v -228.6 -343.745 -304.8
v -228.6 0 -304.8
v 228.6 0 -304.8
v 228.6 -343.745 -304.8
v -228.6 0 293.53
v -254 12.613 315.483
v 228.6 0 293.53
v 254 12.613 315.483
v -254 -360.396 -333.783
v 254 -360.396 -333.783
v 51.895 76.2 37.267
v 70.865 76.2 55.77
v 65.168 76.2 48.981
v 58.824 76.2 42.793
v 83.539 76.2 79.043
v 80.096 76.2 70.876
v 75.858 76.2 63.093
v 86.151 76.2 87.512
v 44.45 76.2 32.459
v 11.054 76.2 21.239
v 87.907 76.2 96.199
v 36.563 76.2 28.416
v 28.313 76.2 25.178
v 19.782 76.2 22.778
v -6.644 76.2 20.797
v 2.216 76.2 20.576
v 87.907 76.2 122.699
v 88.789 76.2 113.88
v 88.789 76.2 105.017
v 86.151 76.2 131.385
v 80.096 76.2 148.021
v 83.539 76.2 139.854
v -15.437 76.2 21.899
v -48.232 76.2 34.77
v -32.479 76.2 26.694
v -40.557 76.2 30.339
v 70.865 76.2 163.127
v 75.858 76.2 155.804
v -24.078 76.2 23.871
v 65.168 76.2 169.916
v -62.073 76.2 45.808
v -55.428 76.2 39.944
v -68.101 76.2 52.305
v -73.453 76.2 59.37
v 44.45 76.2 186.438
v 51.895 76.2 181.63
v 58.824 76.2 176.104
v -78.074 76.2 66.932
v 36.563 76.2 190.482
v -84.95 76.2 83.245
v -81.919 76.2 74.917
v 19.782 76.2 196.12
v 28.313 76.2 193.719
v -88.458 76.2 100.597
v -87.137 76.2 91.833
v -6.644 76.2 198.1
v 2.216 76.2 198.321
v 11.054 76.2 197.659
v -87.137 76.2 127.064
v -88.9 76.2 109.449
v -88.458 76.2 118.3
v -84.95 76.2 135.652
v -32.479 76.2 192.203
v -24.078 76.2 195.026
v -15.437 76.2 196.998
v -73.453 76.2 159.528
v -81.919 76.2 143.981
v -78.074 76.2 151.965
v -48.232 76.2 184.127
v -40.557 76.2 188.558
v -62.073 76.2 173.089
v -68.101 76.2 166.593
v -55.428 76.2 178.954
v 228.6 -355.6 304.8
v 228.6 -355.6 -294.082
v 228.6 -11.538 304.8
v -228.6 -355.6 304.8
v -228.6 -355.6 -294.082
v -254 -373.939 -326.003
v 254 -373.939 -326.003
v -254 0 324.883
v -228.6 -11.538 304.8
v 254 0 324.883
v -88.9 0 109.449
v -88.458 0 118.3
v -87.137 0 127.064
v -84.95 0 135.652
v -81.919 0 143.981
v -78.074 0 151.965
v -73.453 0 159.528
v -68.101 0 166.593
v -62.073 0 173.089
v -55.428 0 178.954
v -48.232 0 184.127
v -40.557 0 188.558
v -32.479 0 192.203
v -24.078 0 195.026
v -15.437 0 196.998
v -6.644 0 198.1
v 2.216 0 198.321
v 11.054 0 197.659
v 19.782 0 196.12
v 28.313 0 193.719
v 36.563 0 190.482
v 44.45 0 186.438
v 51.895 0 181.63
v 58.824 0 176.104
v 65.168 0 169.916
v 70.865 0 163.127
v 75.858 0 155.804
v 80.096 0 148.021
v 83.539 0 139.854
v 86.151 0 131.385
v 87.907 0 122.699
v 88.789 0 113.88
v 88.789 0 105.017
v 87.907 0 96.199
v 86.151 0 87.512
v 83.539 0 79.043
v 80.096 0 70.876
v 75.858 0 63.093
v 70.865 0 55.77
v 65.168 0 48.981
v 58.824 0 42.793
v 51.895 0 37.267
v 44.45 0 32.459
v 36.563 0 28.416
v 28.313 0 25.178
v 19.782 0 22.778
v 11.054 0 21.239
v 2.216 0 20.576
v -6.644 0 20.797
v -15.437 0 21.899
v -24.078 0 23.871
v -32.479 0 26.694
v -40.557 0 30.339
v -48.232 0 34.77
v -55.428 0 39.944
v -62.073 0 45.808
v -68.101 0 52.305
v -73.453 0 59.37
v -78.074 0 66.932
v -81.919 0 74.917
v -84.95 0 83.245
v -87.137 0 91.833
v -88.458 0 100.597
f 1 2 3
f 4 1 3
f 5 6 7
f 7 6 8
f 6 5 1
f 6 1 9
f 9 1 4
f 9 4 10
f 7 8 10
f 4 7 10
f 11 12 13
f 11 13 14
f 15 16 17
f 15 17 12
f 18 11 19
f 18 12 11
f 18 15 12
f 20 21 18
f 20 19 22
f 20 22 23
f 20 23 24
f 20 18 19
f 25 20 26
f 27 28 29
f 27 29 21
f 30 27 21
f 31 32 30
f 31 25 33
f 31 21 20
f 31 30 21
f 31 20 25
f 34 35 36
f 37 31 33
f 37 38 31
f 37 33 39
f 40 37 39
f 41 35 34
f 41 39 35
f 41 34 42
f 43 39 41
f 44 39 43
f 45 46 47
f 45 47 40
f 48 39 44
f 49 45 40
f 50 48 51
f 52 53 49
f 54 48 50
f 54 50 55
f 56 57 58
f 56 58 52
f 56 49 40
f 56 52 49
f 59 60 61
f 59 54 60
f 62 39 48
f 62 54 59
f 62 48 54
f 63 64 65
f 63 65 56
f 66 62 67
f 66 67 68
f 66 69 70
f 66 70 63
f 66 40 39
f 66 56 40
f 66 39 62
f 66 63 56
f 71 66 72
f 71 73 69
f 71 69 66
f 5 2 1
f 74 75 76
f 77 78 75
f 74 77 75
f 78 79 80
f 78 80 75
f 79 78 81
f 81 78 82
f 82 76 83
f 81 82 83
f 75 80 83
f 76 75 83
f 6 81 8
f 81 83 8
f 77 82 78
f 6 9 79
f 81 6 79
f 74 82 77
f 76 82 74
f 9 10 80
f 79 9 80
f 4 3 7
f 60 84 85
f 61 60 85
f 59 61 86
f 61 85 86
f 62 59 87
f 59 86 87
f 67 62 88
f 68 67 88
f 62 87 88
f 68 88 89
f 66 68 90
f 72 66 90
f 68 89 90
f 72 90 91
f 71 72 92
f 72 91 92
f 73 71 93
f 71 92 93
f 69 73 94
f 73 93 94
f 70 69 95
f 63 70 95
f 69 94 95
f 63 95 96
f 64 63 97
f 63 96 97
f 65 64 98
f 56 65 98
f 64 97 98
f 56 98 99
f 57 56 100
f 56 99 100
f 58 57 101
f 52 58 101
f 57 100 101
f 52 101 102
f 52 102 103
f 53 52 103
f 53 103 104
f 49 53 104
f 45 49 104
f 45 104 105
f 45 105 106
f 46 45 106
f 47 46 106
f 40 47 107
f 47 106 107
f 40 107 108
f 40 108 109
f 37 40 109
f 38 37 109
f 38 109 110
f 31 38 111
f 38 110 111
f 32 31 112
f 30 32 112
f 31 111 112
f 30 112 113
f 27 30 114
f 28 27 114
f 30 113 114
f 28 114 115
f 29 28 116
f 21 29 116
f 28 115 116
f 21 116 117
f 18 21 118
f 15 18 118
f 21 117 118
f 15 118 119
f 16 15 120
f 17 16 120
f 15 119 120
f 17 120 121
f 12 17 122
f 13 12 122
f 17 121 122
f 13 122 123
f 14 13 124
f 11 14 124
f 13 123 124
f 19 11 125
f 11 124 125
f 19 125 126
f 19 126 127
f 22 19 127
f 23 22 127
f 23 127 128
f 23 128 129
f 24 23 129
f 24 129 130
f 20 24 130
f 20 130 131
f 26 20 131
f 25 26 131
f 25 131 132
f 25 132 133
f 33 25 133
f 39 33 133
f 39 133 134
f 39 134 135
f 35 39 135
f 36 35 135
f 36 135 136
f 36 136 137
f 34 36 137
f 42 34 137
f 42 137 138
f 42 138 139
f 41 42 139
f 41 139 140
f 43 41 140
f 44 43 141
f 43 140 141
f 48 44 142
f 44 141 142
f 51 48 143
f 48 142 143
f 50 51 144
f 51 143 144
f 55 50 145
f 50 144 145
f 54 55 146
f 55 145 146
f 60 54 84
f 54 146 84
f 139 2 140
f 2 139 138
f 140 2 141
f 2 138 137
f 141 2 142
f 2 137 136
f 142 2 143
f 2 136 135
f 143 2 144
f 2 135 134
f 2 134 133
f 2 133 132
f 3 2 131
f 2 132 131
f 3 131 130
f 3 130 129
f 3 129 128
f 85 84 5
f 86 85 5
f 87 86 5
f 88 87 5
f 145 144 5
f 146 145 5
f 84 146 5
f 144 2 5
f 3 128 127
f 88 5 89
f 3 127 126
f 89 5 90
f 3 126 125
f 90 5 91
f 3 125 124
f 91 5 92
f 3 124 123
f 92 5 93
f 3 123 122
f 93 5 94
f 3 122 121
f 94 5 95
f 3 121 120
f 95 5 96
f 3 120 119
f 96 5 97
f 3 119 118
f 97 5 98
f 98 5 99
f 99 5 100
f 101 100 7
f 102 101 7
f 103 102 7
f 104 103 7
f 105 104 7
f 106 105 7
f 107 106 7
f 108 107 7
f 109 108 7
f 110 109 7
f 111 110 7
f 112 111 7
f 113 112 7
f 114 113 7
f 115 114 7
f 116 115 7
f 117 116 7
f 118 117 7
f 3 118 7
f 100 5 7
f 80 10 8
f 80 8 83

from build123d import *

# Parameters (mm, degrees)
F0_W     = 457.2
F0_H     = 609.6
F1_DEPTH = 355.6
F3_DEPTH = 482.6
F5_DEPTH = 25.4
F6_R     = 88.9
F7_DEPTH = 76.2


with BuildPart() as f1:
    # F0 (on Front) → F1 (new body)
    with BuildSketch(Plane.XZ):
        Rectangle(F0_W, F0_H)
    extrude(amount=F1_DEPTH)

    # F2 (on face) → F3 (join)
    with BuildSketch(Plane(origin=(-228.6, 0, 0), x_dir=(0, -1, 0), z_dir=(-1, 0, 0))):
        Polygon((373.938978, -326.002896), (0, 324.883193), (-12.612531, 315.483219), (360.396054, -333.783408), align=None)
    extrude(amount=-F3_DEPTH)

    # F4 (on face) → F5 (join)
    with BuildSketch(Plane(origin=(-228.6, 0, 0), x_dir=(0, -1, 0), z_dir=(-1, 0, 0))):
        Polygon((373.938978, -326.002896), (0, 324.883193), (-12.612531, 315.483219), (360.396054, -333.783408), align=None)
    extrude(amount=F5_DEPTH)

    # F6 (on face) → F7 (join)
    with BuildSketch(Plane(origin=(0, 0, 0), x_dir=(-1, 0, 0), z_dir=(0, 1, 0))):
        with Locations((0, 109.448686)):
            Circle(F6_R)
    extrude(amount=F7_DEPTH)


solid = f1.part
